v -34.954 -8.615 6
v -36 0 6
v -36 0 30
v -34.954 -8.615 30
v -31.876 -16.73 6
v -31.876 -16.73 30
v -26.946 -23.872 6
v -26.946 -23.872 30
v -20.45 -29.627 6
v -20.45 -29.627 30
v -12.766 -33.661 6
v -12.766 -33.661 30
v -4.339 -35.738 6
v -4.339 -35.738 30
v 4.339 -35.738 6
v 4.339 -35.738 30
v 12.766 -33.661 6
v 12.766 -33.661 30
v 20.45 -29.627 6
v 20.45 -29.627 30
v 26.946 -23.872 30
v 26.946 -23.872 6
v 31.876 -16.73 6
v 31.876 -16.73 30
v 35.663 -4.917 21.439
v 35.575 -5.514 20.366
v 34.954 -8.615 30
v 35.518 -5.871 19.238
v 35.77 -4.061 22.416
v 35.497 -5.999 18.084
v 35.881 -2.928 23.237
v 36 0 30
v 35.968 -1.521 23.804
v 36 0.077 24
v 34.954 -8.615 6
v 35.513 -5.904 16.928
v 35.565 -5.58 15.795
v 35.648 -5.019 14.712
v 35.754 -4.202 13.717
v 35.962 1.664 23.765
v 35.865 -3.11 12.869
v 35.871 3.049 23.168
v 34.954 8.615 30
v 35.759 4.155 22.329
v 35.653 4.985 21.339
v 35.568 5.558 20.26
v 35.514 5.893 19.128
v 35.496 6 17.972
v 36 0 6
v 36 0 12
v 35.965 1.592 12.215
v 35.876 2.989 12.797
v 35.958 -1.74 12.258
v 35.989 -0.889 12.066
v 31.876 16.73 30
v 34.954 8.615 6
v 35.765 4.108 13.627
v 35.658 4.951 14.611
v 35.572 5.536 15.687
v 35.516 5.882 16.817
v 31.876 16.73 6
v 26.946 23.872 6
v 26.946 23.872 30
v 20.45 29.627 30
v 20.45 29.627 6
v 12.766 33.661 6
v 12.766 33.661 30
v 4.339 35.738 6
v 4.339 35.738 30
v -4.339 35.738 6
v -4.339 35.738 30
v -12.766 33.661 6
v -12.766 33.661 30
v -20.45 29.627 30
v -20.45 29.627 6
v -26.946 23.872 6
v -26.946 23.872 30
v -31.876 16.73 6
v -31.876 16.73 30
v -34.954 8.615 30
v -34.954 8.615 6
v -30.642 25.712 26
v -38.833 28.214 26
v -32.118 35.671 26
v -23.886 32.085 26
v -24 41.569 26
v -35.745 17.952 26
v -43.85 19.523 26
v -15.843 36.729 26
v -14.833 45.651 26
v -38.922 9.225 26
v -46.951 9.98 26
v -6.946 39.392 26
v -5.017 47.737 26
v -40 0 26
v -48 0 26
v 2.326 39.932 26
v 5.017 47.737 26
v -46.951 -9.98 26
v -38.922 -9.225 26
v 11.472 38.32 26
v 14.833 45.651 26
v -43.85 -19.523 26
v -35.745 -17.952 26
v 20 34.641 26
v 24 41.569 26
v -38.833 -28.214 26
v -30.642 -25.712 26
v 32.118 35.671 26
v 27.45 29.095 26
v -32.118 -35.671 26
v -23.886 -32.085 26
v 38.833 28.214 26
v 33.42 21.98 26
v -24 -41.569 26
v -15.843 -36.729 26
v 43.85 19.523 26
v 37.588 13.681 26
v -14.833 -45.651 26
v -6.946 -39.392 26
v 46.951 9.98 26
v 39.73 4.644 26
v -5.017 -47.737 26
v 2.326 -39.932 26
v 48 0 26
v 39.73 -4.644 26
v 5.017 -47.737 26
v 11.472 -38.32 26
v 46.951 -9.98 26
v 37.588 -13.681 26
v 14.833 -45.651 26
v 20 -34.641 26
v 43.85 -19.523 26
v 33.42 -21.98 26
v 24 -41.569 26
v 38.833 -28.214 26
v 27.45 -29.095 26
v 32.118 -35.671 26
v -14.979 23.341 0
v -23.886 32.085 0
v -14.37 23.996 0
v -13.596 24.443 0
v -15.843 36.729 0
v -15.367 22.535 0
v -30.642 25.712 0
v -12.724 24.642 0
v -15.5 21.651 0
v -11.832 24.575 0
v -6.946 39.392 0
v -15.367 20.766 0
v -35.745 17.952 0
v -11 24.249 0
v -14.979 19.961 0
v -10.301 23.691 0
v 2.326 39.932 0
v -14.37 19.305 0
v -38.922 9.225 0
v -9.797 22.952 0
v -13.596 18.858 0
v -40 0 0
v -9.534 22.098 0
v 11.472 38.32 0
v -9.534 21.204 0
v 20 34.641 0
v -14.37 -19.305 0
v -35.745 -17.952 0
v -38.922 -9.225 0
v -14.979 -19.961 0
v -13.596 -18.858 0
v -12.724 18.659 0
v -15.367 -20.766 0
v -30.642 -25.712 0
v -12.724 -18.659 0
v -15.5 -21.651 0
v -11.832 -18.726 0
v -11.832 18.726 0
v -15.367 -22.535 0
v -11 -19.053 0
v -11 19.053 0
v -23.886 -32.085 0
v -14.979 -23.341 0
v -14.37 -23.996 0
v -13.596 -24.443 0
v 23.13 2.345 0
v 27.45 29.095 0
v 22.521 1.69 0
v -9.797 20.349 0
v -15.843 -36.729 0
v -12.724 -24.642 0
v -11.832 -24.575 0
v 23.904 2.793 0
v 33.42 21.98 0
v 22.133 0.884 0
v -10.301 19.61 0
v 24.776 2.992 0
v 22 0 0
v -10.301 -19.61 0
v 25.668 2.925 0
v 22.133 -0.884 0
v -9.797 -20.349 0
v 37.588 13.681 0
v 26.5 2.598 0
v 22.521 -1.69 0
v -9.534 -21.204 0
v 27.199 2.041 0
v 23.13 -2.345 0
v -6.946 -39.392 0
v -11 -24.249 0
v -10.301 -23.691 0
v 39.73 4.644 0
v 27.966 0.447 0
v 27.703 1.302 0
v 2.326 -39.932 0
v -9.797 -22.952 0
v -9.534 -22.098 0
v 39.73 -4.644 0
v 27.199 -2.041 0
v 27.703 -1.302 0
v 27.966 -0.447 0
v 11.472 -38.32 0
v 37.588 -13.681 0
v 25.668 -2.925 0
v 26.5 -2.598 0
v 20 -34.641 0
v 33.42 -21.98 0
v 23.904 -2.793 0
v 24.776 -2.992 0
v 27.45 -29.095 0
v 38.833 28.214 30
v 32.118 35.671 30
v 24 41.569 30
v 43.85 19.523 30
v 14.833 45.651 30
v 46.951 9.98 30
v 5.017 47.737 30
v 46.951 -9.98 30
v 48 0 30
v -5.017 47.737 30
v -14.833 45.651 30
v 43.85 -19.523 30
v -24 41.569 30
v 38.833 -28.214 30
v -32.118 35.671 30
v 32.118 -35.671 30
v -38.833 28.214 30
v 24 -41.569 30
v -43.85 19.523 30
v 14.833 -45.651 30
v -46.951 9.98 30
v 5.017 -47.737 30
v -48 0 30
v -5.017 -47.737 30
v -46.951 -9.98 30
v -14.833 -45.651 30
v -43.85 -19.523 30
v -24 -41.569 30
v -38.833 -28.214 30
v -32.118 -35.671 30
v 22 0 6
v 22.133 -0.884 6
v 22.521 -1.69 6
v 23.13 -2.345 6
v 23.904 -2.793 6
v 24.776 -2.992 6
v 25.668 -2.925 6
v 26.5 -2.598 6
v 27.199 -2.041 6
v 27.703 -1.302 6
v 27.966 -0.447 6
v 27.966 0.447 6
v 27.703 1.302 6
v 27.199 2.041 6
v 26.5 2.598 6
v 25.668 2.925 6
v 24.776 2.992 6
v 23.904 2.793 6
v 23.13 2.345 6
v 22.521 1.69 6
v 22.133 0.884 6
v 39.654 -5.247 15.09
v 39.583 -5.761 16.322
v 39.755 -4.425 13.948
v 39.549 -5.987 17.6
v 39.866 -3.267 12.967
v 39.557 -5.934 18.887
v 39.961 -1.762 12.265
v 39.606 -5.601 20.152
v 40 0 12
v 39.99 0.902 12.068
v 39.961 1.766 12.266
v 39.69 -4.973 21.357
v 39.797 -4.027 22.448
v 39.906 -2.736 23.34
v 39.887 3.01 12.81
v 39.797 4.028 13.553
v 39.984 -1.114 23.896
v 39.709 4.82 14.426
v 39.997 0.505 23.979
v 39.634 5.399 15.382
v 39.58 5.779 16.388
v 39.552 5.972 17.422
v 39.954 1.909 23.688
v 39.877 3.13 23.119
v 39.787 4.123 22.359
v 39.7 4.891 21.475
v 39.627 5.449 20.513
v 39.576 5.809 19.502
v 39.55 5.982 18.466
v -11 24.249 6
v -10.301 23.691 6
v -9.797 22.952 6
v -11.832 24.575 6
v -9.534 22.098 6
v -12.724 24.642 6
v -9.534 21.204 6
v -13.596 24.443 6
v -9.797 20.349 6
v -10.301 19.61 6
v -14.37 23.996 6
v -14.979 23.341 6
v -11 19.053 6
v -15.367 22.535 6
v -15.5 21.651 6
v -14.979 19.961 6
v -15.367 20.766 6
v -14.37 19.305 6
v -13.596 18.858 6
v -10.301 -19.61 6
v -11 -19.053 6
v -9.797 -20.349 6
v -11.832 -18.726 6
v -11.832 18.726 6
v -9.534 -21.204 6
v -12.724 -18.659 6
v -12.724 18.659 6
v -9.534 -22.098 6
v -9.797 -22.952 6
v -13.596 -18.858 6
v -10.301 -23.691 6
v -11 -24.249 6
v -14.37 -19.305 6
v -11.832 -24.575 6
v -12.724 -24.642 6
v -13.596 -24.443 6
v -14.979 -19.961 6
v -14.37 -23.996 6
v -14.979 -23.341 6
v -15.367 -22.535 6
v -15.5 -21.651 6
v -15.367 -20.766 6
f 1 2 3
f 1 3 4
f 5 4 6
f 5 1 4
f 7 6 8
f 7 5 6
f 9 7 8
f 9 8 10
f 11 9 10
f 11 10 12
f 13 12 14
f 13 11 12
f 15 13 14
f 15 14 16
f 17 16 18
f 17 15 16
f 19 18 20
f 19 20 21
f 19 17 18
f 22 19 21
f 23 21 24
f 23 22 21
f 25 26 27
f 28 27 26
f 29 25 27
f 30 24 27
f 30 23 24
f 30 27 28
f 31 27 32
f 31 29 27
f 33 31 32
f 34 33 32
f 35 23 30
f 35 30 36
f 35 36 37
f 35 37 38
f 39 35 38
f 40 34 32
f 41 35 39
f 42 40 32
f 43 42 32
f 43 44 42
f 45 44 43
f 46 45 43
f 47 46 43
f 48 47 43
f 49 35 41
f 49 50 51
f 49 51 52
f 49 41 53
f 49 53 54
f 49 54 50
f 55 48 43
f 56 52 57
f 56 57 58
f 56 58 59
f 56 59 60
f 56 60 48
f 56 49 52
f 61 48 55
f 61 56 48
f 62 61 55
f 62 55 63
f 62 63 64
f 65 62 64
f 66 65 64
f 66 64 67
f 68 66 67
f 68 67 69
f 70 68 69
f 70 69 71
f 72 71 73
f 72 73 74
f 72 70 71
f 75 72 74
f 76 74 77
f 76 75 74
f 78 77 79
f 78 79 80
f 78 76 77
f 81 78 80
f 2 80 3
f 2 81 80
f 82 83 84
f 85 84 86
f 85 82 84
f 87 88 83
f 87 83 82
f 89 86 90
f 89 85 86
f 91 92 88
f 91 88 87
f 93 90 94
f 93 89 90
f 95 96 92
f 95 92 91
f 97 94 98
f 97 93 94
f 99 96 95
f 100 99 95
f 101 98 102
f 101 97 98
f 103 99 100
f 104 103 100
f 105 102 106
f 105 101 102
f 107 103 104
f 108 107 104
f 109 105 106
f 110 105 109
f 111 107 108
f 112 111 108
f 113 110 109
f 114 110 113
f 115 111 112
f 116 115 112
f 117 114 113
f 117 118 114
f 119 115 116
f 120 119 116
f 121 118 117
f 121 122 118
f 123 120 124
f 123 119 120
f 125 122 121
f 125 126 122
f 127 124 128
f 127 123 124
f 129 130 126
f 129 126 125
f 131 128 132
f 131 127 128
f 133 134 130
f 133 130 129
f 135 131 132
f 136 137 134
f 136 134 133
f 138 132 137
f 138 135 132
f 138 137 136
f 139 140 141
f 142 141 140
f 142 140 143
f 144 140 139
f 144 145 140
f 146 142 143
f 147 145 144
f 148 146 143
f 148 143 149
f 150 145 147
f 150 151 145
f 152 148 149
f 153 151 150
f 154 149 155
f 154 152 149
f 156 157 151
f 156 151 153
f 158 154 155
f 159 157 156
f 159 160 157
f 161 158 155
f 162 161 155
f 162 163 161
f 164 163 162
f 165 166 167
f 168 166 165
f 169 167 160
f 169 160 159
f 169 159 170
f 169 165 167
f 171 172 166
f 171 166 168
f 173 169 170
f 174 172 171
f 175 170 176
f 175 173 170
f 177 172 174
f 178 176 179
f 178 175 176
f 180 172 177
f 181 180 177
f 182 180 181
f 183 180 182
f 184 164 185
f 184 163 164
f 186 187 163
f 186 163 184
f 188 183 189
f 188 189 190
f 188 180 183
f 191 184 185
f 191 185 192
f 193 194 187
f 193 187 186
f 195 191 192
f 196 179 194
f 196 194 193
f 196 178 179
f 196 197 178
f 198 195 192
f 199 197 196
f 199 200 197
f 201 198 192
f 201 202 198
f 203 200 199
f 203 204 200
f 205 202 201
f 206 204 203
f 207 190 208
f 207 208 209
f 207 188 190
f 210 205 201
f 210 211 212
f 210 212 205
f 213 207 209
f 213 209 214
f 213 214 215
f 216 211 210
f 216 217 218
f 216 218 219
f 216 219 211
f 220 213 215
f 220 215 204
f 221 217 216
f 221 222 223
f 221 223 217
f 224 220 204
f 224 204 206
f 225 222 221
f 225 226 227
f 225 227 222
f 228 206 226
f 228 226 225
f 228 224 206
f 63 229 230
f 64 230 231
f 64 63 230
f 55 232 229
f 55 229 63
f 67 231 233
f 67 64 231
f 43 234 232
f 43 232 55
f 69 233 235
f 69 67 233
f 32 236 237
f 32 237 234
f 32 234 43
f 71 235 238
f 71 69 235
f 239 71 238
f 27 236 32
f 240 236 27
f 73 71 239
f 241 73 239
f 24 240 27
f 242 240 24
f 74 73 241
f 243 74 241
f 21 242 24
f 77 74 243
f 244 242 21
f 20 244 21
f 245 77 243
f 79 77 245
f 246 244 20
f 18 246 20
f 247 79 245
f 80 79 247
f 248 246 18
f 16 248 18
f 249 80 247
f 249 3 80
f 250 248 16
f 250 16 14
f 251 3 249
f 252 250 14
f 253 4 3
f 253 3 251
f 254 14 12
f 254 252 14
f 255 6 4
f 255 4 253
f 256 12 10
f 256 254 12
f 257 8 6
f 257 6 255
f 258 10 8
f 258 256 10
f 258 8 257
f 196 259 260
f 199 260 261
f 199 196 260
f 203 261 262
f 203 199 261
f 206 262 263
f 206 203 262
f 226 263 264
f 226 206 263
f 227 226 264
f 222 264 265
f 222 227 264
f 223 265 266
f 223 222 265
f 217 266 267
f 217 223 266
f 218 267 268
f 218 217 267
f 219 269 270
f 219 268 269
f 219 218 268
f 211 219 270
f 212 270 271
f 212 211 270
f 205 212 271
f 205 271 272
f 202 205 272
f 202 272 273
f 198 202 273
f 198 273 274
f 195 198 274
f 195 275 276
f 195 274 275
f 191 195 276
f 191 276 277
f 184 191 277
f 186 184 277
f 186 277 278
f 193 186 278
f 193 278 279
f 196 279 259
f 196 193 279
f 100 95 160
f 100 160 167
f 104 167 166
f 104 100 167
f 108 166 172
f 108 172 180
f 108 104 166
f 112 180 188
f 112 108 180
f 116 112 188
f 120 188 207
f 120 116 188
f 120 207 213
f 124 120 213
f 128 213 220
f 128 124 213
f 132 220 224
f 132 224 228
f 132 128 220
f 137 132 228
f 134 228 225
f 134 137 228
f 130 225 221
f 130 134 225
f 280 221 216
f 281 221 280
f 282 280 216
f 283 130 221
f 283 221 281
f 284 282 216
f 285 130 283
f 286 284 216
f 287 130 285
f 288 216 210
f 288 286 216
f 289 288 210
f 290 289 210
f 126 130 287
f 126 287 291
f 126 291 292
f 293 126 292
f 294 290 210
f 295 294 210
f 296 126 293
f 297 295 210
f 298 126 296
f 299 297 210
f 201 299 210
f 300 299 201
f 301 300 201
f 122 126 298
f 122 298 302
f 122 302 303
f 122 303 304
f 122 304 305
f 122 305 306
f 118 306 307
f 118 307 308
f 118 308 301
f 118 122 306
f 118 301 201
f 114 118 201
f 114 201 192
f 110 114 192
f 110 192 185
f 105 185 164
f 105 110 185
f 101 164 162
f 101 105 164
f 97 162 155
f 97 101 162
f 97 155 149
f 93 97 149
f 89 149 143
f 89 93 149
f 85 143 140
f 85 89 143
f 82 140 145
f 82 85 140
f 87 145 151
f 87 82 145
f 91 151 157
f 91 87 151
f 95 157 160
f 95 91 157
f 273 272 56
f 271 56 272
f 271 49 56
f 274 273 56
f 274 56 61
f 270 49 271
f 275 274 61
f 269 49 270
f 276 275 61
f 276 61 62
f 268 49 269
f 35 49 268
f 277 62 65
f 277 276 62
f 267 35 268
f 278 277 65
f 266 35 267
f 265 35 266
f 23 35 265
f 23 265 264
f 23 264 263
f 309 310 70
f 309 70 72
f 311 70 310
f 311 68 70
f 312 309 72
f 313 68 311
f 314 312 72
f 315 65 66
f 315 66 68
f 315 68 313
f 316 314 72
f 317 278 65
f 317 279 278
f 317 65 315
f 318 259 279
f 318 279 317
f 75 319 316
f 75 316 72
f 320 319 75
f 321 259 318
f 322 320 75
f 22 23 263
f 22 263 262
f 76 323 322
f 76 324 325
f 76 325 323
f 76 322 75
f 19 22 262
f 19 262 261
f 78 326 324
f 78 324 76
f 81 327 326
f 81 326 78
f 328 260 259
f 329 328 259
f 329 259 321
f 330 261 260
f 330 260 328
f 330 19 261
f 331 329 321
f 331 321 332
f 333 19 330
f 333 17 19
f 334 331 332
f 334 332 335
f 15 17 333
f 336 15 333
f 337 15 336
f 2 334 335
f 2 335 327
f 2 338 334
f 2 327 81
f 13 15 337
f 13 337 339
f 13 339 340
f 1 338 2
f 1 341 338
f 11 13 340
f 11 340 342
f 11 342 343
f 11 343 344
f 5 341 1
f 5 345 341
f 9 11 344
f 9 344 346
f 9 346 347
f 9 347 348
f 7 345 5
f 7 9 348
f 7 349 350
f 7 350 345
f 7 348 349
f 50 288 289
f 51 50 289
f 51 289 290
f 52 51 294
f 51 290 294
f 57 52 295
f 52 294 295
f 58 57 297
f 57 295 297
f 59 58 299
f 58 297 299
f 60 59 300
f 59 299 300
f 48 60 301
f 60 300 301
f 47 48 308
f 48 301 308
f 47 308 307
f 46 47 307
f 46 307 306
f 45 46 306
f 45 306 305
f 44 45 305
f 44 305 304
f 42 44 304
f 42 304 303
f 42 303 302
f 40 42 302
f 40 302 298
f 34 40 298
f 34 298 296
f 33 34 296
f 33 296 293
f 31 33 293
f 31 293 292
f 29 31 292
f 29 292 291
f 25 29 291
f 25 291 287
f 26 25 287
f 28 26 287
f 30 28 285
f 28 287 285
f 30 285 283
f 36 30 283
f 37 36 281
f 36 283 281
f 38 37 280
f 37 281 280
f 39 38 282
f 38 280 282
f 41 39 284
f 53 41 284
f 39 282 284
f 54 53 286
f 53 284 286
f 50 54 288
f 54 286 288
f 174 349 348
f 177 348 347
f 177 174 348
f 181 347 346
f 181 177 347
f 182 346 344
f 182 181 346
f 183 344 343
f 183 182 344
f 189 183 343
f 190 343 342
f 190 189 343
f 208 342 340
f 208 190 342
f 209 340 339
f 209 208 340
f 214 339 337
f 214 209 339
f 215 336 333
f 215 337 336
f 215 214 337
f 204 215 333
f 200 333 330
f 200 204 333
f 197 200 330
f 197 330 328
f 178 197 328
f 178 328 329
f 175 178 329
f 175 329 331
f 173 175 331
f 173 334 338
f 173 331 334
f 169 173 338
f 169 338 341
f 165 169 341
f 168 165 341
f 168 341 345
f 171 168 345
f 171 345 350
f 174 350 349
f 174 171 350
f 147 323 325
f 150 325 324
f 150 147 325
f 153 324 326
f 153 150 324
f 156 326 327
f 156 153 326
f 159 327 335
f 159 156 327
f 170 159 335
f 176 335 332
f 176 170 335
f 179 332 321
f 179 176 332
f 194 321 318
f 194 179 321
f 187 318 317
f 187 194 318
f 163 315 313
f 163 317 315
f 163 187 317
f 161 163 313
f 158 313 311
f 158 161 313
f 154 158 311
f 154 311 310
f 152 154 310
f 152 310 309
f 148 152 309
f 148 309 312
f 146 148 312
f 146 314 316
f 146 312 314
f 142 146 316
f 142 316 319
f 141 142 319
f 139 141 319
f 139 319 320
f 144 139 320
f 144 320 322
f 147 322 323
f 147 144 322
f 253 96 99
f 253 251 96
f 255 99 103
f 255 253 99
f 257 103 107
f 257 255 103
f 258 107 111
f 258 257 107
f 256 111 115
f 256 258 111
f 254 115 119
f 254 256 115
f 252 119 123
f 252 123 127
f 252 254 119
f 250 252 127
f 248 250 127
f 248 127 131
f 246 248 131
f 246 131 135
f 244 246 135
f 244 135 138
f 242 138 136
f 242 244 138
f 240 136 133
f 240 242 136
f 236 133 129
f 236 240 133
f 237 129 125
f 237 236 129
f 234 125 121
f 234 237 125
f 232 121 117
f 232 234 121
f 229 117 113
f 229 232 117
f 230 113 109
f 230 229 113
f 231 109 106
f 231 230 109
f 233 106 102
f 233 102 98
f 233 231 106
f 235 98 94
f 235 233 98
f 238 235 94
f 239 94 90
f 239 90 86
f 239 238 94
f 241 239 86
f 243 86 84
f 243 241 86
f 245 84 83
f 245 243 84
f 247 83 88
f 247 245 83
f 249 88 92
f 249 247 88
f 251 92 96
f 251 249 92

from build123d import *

# Parameters (mm, degrees)
SKETCH_3_R          = 3
CUT_EXTRUDE_1_DEPTH = 75.215901261
SKETCH_4_R          = 6
CUT_EXTRUDE_2_DEPTH = 6


with BuildPart() as part:
    # 草图2 → 旋转2 (revolve)
    with BuildSketch(Plane(origin=(0, 0, 0), x_dir=(1, 0, 0), z_dir=(0, 1, 0)), mode=Mode.PRIVATE) as revolve_2_sk:
        Polygon((0, 0), (40, 0), (40, -26), (48, -26), (48, -30), (36, -30), (36, -6), (0, -6), align=None)
    revolve(revolve_2_sk.sketch.rotate(Axis((0, 0, 0), (0, 0, 1)), 180), axis=Axis((0, 0, 0), (0, 0, 1)))

    # 草图3 → 切除-拉伸1 (cut, through all)
    with BuildSketch(Plane.XY):
        with Locations(Location((25, 0, 0), (0, 0, 180))):
            Circle(SKETCH_3_R)
        with Locations(Location((-12.5, 21.650635, 0), (0, 0, 180))):
            Circle(SKETCH_3_R)
        with Locations(Location((-12.5, -21.650635, 0), (0, 0, 180))):
            Circle(SKETCH_3_R)
    extrude(amount=CUT_EXTRUDE_1_DEPTH, mode=Mode.SUBTRACT)

    # 草图4 → 切除-拉伸2 (cut)
    with BuildSketch(Plane(origin=(40, 0, 0), x_dir=(0, 0, -1), z_dir=(1, 0, 0))):
        with Locations((-18, 0)):
            Circle(SKETCH_4_R)
    extrude(amount=-CUT_EXTRUDE_2_DEPTH, mode=Mode.SUBTRACT)


solid = part.part
